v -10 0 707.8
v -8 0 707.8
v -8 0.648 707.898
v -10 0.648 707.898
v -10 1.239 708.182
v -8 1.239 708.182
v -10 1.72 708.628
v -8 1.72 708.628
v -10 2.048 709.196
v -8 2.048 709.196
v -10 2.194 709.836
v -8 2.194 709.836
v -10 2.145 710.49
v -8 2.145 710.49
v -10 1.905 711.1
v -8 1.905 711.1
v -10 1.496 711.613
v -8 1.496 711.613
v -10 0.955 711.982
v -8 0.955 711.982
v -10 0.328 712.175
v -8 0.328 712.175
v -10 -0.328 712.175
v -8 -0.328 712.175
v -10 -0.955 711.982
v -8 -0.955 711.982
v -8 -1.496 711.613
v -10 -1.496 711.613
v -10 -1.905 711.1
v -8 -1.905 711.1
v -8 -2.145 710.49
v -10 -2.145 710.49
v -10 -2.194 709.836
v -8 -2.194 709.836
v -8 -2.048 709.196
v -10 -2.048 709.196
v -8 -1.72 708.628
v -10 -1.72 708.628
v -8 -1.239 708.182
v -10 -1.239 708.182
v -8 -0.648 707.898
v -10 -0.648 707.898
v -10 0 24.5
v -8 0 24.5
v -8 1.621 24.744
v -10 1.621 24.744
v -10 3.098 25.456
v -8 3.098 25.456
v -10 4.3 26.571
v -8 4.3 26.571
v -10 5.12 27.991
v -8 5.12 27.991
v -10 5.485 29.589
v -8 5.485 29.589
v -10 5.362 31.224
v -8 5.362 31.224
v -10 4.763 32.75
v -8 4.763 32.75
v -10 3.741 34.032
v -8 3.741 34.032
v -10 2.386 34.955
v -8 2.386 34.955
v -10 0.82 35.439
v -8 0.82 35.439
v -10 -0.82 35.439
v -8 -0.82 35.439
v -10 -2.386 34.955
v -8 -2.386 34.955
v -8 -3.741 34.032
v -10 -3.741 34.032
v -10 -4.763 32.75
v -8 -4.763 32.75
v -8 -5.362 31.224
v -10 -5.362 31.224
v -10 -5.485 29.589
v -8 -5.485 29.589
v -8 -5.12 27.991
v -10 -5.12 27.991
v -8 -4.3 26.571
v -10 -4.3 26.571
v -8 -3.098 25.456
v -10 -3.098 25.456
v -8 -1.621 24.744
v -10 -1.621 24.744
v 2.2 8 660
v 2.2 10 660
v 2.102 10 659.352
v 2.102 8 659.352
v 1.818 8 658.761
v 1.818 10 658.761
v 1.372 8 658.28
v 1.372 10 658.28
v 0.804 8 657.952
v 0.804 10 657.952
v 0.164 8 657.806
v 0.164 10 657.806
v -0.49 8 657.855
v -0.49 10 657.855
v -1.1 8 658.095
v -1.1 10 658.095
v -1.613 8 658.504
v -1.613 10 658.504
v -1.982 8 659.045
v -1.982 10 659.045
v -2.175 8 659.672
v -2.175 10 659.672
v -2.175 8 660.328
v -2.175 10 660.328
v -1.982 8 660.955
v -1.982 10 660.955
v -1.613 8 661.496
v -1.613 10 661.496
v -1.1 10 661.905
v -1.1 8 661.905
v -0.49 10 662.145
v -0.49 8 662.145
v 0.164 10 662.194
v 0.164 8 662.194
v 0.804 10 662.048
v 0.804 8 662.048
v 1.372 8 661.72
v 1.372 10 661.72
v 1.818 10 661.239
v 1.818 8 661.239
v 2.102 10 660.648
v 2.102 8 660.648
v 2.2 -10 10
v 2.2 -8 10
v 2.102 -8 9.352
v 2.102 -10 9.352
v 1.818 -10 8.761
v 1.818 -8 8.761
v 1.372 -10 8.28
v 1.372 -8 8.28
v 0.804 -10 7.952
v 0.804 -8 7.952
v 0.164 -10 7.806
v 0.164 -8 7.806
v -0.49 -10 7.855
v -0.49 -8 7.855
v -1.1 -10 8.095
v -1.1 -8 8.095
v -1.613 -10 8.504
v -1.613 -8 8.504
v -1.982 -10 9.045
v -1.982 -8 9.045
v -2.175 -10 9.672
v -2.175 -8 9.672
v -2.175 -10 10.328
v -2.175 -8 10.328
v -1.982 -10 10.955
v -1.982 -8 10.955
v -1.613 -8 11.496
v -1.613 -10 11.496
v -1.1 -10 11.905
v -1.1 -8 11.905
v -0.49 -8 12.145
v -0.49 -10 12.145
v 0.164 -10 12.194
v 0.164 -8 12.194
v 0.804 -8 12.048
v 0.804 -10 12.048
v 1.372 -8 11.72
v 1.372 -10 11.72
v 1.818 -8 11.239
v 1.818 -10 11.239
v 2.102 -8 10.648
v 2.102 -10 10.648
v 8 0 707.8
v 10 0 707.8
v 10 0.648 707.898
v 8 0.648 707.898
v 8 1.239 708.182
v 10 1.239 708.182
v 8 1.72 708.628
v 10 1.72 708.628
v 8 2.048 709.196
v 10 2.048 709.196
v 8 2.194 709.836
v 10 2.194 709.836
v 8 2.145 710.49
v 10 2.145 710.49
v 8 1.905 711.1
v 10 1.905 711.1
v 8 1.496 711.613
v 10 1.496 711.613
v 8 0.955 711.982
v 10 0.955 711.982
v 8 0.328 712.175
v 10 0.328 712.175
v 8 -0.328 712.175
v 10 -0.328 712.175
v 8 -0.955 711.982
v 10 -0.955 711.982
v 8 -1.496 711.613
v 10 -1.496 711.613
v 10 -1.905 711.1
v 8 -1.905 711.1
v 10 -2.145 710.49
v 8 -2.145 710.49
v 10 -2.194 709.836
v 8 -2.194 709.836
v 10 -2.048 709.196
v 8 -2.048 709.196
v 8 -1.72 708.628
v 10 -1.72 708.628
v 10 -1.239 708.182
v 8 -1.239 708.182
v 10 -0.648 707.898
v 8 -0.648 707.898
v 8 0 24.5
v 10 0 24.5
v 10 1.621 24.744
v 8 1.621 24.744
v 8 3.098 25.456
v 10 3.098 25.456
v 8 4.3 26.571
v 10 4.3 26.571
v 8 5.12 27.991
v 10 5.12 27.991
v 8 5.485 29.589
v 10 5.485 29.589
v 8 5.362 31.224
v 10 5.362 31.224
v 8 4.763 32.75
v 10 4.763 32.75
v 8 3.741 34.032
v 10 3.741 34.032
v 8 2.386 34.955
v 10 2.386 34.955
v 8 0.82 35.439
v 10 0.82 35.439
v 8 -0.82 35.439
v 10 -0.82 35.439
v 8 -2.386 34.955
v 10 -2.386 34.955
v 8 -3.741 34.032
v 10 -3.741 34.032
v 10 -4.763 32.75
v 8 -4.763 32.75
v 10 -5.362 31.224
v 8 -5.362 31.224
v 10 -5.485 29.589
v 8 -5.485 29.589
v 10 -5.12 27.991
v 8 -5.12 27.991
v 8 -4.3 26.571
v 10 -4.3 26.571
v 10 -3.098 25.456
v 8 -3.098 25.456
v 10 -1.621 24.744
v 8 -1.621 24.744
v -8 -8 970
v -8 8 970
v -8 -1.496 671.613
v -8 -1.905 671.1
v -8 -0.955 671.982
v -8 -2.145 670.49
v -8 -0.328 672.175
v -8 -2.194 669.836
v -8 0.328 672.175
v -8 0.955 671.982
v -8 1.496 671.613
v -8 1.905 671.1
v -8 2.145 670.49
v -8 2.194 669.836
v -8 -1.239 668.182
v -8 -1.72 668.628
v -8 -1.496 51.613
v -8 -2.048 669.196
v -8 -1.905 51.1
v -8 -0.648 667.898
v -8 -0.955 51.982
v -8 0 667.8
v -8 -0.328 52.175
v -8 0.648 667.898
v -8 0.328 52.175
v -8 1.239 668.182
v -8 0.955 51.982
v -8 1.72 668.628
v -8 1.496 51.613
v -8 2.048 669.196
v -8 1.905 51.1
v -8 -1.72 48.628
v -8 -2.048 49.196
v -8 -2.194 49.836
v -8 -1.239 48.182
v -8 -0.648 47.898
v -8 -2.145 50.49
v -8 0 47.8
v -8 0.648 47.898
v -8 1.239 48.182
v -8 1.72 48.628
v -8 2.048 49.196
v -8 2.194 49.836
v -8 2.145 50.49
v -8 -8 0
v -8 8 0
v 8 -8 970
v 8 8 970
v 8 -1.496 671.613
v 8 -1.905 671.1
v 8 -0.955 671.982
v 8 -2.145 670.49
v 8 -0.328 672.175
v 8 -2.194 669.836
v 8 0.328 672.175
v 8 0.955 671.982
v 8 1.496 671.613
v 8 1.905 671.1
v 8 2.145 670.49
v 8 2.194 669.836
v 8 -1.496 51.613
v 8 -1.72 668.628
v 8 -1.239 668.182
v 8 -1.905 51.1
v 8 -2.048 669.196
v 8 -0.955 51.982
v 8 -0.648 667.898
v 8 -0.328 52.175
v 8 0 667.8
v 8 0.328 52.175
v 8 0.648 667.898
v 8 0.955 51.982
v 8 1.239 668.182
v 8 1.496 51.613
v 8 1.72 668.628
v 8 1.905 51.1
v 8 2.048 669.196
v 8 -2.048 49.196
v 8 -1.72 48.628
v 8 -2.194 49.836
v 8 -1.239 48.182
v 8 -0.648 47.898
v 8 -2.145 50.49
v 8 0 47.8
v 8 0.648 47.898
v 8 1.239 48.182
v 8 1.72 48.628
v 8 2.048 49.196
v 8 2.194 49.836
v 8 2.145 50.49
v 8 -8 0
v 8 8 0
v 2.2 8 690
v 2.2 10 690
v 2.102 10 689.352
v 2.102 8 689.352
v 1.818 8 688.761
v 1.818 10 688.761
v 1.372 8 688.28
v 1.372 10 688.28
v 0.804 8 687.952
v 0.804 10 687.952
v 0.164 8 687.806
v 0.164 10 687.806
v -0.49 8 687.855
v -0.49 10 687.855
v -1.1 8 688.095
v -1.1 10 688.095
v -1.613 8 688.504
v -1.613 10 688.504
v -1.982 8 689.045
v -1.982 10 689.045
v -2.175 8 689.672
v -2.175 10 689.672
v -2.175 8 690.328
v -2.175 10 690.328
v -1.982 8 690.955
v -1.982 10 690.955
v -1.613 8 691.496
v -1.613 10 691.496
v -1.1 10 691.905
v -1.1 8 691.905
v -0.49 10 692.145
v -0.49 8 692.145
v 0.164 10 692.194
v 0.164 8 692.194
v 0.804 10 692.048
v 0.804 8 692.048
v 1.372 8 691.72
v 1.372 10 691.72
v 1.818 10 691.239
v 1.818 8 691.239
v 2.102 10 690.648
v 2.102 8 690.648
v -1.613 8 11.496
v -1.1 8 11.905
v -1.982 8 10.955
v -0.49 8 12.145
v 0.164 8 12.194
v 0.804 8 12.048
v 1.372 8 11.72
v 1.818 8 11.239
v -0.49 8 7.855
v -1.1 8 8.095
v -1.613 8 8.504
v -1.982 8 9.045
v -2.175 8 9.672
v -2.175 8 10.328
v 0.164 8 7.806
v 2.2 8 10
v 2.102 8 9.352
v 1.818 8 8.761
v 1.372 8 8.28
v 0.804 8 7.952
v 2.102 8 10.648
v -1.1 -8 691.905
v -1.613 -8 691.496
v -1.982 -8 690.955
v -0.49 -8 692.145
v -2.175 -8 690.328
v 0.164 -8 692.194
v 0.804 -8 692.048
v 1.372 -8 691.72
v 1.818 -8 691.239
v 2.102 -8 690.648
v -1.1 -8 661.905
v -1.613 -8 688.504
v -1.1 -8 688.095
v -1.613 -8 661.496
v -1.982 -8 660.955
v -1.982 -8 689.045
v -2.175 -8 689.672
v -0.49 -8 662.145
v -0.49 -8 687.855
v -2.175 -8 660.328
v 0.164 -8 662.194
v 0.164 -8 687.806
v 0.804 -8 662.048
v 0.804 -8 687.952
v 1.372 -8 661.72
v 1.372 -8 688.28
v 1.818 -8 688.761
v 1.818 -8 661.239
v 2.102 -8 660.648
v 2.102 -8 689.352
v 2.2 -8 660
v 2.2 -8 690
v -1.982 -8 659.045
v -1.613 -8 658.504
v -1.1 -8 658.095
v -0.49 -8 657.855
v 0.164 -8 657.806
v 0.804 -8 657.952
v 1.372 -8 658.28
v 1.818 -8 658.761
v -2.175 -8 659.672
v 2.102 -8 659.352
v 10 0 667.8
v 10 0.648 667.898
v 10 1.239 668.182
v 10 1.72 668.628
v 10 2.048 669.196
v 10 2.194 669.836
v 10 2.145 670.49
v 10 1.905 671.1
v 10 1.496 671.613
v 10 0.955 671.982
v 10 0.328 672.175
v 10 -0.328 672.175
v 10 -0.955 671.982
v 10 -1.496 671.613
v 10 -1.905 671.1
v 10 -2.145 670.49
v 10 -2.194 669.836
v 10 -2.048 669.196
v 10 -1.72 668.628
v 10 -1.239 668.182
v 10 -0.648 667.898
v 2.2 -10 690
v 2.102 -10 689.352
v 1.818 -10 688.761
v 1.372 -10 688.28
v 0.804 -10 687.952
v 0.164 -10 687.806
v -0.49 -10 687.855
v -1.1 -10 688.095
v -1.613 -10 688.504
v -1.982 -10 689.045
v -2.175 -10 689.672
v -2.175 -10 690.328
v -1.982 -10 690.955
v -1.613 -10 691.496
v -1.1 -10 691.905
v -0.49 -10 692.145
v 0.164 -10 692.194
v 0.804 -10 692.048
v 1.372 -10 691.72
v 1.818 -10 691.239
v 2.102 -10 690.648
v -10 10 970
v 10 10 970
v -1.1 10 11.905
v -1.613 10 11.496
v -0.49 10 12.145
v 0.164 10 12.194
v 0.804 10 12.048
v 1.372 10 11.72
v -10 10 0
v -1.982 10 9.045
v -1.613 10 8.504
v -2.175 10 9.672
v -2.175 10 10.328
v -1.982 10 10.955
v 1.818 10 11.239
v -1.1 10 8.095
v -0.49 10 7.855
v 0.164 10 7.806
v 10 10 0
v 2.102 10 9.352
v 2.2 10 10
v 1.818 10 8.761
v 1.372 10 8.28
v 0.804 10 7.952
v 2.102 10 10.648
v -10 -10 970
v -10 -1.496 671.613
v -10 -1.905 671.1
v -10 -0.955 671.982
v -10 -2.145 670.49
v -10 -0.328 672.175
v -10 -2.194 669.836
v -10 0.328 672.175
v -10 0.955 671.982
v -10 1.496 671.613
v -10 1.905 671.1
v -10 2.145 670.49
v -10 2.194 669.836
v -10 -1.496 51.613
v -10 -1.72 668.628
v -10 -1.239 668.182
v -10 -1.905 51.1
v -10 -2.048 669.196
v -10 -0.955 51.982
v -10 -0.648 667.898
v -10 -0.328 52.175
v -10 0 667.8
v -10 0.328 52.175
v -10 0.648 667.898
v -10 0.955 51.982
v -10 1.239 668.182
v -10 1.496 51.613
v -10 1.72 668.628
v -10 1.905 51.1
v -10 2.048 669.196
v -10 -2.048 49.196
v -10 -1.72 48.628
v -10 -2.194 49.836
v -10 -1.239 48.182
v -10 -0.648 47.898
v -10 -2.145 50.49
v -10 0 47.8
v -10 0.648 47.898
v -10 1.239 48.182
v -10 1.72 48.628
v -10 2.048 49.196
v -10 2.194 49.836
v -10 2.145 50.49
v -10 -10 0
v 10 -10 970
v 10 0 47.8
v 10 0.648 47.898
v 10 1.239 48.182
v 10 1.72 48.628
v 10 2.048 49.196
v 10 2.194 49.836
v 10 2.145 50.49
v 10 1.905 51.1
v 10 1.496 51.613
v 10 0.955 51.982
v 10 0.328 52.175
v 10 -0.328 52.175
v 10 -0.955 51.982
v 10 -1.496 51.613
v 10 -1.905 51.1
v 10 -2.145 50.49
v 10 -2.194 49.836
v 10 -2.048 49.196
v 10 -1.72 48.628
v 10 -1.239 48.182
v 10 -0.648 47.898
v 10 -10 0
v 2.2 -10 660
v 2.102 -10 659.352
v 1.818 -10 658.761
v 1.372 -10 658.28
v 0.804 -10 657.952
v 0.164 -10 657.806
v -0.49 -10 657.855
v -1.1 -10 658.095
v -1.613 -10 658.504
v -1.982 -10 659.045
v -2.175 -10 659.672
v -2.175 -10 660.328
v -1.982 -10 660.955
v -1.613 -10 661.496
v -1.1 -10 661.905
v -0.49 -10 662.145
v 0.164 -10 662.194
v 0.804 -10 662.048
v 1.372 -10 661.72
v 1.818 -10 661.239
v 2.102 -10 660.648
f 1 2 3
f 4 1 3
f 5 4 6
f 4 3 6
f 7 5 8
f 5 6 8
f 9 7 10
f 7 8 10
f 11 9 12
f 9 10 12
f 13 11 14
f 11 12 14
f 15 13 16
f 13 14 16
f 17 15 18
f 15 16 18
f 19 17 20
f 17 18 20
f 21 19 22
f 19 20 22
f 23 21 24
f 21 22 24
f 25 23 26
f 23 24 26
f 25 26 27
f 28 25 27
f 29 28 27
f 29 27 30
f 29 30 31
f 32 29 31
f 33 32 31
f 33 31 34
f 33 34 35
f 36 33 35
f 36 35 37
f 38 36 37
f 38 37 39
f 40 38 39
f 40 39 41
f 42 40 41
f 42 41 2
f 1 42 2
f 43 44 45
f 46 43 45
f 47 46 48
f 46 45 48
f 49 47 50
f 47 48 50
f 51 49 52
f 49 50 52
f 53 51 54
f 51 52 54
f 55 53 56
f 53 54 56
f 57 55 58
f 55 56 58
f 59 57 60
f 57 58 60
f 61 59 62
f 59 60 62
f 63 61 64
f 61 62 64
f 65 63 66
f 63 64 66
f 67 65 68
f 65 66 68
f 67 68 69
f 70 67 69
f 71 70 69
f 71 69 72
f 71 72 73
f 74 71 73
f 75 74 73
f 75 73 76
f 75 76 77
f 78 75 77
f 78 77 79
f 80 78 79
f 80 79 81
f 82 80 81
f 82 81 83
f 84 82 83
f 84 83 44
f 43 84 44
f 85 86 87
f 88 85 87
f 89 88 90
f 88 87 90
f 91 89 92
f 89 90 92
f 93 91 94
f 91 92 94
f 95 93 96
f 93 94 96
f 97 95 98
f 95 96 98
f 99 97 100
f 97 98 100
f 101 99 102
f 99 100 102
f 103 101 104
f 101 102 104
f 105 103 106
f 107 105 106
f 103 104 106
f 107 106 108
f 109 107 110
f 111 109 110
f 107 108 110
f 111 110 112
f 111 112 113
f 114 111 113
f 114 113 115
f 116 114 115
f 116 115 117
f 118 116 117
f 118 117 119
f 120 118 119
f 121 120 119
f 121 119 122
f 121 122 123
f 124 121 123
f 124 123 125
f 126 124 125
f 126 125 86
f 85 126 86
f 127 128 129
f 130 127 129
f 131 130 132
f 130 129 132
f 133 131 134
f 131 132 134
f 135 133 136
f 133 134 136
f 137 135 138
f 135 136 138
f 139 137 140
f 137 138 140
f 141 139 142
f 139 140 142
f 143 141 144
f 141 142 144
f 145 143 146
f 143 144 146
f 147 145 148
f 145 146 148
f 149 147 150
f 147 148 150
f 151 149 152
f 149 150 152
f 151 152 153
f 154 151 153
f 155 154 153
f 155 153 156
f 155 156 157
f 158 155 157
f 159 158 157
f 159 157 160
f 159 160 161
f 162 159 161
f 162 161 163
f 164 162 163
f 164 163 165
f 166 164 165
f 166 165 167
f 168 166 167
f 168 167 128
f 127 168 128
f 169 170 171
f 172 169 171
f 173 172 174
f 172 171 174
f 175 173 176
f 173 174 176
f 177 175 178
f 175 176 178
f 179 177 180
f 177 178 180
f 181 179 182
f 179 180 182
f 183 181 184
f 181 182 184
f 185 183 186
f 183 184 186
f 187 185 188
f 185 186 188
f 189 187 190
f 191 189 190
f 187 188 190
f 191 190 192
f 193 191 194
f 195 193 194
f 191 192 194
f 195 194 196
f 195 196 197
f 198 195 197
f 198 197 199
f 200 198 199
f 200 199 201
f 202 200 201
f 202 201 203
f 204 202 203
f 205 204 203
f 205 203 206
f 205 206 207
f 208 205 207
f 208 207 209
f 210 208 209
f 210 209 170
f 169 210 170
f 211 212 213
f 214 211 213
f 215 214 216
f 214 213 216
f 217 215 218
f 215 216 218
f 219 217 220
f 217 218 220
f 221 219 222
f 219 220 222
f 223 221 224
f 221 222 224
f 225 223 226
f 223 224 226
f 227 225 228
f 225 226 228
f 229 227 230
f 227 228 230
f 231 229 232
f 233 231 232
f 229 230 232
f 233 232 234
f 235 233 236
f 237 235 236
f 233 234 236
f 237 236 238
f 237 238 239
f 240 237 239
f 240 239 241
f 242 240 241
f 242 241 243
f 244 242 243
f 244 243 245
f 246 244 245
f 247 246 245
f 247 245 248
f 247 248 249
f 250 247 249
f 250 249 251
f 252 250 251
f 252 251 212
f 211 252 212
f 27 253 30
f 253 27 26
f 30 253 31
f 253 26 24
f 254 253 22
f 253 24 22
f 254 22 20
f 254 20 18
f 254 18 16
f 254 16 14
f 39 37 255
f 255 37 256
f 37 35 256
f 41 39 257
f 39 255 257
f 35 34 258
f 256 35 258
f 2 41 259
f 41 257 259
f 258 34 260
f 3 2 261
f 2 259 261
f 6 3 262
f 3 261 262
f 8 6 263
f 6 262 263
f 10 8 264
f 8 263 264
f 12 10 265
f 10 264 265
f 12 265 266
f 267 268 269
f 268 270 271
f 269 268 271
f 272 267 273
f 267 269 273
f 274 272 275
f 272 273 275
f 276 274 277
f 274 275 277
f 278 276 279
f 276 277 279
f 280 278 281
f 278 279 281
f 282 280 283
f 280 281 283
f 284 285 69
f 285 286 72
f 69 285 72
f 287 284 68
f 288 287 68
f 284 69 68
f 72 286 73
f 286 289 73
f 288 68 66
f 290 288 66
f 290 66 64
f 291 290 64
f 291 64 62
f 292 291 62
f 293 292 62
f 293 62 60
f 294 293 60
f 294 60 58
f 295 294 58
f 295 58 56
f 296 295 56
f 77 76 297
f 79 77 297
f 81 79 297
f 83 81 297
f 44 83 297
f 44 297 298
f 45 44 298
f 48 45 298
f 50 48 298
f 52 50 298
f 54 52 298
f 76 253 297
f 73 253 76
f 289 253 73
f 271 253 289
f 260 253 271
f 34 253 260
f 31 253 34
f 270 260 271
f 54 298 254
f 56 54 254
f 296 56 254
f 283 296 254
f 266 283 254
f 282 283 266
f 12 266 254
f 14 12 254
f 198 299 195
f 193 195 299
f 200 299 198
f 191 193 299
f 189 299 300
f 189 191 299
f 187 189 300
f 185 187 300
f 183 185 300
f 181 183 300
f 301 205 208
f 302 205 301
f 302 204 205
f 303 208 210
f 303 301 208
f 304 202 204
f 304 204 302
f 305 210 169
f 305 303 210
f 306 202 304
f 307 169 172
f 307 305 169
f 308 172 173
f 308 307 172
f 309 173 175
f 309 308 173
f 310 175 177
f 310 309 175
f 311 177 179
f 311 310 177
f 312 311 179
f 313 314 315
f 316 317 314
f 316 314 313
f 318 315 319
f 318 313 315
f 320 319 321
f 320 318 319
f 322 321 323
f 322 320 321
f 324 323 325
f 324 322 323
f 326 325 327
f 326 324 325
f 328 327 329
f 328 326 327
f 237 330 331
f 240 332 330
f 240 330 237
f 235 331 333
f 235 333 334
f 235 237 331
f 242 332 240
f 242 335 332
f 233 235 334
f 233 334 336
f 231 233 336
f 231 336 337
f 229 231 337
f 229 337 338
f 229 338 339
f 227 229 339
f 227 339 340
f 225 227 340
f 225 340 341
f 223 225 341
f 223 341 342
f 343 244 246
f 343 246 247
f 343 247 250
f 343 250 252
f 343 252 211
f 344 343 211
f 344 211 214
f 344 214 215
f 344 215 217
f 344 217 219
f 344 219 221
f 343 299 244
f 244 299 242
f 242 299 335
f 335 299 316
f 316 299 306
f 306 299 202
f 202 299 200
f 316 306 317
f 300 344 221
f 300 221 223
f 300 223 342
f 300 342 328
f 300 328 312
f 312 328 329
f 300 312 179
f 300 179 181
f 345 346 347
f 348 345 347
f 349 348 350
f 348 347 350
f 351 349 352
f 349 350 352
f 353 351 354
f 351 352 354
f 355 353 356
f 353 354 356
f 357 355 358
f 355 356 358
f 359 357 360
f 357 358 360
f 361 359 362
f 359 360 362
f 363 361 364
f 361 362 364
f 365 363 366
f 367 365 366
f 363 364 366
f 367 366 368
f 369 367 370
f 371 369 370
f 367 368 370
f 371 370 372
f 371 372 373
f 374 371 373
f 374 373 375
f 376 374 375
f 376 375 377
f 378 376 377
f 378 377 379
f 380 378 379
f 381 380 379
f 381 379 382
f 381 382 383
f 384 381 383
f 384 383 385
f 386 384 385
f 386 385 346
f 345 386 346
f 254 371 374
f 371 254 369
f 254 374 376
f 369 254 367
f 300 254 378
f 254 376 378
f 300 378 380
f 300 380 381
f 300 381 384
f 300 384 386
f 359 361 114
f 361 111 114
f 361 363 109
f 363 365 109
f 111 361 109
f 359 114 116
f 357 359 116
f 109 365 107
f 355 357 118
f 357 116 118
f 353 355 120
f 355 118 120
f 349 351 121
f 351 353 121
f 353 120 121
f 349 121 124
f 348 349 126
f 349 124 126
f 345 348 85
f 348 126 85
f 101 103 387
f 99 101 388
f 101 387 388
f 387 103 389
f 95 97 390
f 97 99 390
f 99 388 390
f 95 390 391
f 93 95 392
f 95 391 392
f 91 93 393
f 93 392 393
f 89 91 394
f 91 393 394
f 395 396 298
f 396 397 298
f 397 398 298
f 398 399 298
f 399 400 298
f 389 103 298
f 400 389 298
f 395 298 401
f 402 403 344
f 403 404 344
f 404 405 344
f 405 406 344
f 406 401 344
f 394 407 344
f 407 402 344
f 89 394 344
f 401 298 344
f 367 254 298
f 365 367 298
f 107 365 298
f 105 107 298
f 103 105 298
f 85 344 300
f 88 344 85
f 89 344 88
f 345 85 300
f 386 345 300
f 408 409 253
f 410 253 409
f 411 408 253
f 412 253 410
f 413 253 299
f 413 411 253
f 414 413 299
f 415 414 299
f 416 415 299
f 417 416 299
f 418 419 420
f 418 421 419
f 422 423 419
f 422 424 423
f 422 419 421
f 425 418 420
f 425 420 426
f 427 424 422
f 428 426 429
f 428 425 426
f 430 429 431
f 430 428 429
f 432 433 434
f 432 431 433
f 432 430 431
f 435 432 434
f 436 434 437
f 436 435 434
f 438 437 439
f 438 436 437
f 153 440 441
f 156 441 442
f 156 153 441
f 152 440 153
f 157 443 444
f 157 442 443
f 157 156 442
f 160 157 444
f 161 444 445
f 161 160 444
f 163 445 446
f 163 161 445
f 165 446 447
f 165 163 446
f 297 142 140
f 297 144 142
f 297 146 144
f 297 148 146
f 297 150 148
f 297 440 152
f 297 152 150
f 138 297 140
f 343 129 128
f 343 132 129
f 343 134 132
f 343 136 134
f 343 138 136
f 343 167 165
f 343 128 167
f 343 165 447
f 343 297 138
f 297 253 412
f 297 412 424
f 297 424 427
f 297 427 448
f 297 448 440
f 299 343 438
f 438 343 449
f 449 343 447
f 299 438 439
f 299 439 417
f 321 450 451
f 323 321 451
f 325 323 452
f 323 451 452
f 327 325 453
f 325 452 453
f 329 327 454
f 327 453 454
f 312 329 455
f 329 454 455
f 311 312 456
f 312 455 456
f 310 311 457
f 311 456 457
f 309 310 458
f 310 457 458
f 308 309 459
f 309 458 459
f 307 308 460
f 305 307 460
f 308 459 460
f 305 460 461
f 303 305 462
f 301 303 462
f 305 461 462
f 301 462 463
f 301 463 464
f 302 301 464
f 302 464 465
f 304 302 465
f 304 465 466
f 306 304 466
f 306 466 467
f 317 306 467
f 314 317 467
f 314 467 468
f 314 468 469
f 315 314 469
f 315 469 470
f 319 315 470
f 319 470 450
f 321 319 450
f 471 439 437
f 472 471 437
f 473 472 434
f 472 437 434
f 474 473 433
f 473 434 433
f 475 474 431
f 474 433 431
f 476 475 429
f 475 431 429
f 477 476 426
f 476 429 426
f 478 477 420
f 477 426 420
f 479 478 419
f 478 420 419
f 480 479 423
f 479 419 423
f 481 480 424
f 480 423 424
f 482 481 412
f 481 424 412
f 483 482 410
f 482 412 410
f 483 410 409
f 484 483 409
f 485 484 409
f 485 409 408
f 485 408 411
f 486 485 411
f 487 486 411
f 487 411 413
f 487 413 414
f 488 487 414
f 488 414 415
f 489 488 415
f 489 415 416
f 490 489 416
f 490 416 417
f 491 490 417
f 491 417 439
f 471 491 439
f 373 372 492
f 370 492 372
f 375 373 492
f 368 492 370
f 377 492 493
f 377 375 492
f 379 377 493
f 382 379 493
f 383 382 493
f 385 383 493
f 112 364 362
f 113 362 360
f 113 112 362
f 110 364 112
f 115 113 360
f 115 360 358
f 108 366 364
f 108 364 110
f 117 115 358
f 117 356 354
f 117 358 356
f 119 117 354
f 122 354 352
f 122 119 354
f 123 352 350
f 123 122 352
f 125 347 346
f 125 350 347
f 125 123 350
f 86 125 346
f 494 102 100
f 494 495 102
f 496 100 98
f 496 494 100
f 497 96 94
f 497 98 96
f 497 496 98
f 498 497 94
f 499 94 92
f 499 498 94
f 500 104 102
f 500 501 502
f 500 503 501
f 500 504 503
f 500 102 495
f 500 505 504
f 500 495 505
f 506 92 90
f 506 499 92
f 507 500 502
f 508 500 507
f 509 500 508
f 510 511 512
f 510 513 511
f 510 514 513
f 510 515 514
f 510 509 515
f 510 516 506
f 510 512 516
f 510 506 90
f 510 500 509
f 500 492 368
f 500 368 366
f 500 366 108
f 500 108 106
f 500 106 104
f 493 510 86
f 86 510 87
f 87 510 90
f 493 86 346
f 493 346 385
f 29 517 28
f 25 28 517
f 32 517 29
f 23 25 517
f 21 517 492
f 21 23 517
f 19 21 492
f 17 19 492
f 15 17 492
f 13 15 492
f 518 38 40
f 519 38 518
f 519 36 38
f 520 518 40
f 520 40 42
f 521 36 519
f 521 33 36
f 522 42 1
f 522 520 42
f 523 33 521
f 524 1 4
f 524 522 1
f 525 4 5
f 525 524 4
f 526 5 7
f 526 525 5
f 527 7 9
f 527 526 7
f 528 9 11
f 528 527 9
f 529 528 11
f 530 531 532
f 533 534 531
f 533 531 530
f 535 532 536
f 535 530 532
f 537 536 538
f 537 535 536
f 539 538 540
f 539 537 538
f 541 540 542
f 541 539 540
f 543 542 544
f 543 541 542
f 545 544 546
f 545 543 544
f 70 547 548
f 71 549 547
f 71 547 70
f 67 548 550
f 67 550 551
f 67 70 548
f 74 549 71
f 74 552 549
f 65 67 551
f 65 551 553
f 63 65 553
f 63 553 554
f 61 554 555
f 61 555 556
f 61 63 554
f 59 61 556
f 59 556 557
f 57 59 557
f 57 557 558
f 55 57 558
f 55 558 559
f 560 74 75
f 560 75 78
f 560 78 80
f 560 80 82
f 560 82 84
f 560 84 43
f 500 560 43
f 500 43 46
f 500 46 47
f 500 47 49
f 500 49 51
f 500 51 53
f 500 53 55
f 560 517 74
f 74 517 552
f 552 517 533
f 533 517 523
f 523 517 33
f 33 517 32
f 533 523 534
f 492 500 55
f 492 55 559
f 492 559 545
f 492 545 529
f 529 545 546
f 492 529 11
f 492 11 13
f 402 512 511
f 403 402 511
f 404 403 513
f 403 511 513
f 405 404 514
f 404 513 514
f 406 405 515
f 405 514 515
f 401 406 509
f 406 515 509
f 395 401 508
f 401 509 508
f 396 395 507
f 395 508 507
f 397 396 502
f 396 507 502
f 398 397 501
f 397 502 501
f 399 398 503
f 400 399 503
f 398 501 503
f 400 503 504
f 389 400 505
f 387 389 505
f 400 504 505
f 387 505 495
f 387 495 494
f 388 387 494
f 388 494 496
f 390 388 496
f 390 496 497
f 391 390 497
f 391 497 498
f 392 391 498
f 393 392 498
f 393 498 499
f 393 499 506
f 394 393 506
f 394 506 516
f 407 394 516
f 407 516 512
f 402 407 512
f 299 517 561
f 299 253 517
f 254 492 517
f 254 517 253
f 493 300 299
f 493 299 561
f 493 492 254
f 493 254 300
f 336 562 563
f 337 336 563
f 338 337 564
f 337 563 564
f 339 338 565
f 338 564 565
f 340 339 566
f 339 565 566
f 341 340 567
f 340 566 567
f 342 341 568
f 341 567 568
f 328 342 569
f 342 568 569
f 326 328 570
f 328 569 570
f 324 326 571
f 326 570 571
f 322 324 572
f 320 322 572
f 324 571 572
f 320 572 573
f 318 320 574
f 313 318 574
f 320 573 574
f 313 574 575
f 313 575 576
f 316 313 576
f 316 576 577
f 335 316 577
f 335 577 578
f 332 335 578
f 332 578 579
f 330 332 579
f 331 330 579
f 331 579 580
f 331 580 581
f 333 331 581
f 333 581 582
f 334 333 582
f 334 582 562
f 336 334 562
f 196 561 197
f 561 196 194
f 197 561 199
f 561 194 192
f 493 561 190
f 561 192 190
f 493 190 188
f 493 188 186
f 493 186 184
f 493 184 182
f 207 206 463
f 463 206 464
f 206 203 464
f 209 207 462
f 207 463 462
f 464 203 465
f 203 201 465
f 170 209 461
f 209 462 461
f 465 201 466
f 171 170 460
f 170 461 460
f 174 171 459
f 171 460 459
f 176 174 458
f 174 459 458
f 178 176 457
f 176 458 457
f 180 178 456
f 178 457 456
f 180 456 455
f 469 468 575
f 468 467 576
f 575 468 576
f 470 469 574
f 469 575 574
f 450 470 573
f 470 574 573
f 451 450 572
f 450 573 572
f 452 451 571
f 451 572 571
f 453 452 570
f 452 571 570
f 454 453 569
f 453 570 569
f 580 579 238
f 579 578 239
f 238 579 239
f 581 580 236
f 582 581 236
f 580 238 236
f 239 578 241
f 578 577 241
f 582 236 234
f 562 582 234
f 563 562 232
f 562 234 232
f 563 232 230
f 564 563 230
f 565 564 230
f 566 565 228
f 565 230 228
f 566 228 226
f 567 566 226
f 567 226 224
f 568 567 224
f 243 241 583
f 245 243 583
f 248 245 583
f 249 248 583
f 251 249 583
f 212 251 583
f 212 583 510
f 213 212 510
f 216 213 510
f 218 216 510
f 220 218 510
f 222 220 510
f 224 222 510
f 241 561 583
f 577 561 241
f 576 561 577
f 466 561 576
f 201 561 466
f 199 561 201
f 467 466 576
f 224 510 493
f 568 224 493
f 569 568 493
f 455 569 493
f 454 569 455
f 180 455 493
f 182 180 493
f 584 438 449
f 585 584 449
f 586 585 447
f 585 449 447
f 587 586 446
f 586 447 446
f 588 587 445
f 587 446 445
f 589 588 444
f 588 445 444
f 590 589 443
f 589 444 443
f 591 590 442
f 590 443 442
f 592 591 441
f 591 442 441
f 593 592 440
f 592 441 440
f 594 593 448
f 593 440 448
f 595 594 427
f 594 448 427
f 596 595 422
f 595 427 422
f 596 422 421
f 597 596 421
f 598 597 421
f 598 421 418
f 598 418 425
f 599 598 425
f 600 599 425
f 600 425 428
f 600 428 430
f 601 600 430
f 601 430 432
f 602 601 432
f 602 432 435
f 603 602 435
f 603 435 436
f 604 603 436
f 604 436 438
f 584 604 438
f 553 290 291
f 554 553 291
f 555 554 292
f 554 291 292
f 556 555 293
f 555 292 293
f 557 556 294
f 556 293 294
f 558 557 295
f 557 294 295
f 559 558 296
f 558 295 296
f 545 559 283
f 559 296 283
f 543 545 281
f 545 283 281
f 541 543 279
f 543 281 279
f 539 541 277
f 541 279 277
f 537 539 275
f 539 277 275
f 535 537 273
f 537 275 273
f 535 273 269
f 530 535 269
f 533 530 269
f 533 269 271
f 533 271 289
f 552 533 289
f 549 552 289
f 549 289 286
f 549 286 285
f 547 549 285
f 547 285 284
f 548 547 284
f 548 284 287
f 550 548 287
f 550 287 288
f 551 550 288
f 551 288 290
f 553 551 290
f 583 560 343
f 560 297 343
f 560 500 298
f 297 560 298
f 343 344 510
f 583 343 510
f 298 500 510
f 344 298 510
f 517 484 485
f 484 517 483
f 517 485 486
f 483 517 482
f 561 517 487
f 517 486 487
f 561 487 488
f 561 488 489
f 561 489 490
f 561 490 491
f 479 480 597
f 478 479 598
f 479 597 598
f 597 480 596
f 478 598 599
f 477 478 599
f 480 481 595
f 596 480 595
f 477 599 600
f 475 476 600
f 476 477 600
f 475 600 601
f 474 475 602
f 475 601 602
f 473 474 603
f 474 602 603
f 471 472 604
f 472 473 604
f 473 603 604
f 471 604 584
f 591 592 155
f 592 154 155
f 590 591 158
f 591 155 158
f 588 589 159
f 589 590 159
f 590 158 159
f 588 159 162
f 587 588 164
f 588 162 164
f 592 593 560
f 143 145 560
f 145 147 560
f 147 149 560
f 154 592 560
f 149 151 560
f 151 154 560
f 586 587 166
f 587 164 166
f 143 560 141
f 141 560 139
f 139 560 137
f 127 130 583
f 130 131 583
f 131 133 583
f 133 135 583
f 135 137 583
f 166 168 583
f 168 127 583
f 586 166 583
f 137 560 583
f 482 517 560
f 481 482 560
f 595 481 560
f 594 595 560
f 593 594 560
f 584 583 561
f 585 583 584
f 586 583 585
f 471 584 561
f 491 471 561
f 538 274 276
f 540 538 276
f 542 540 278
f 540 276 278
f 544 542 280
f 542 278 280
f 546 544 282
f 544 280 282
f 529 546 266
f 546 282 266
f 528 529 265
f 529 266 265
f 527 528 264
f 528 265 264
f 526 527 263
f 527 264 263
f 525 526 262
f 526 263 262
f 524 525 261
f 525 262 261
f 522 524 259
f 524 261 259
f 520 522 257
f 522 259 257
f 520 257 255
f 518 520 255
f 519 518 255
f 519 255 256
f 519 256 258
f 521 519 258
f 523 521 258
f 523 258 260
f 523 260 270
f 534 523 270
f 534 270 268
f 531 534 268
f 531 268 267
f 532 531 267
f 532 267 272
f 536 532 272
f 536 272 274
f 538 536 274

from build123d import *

# Parameters (mm, degrees)
SKETCH_1_W          = 20
SKETCH_1_H          = 20
SKETCH_1_W_2        = 16
SKETCH_1_H_2        = 16
EXTRUDE_1_DEPTH     = 970
SKETCH_2_R          = 2.2
SKETCH_2_R_2        = 5.5
CUT_EXTRUDE_1_DEPTH = 970
SKETCH_3_R          = 2.2
CUT_EXTRUDE_2_DEPTH = 970


with BuildPart() as part:
    # ｽｹｯﾁ1 → ﾎﾞｽ - 押し出し1 (new body)
    with BuildSketch(Plane.XY):
        Rectangle(SKETCH_1_W, SKETCH_1_H)
        Rectangle(SKETCH_1_W_2, SKETCH_1_H_2, mode=Mode.SUBTRACT)
    extrude(amount=EXTRUDE_1_DEPTH)

    # ｽｹｯﾁ2 → ｶｯﾄ - 押し出し1 (cut)
    with BuildSketch(Plane(origin=(10, 0, 0), x_dir=(0, 0, -1), z_dir=(1, 0, 0))):
        with Locations((-710, 0)):
            Circle(SKETCH_2_R)
        with Locations((-670, 0)):
            Circle(SKETCH_2_R)
        with Locations((-50, 0)):
            Circle(SKETCH_2_R)
        with Locations((-30, 0)):
            Circle(SKETCH_2_R_2)
    extrude(amount=-CUT_EXTRUDE_1_DEPTH, mode=Mode.SUBTRACT)

    # ｽｹｯﾁ3 → ｶｯﾄ - 押し出し2 (cut)
    with BuildSketch(Plane(origin=(0, 10, 0), x_dir=(1, 0, 0), z_dir=(0, 1, 0))):
        with Locations((0, -690)):
            Circle(SKETCH_3_R)
        with Locations((0, -660)):
            Circle(SKETCH_3_R)
        with Locations((0, -10)):
            Circle(SKETCH_3_R)
    extrude(amount=-CUT_EXTRUDE_2_DEPTH, mode=Mode.SUBTRACT)


solid = part.part
